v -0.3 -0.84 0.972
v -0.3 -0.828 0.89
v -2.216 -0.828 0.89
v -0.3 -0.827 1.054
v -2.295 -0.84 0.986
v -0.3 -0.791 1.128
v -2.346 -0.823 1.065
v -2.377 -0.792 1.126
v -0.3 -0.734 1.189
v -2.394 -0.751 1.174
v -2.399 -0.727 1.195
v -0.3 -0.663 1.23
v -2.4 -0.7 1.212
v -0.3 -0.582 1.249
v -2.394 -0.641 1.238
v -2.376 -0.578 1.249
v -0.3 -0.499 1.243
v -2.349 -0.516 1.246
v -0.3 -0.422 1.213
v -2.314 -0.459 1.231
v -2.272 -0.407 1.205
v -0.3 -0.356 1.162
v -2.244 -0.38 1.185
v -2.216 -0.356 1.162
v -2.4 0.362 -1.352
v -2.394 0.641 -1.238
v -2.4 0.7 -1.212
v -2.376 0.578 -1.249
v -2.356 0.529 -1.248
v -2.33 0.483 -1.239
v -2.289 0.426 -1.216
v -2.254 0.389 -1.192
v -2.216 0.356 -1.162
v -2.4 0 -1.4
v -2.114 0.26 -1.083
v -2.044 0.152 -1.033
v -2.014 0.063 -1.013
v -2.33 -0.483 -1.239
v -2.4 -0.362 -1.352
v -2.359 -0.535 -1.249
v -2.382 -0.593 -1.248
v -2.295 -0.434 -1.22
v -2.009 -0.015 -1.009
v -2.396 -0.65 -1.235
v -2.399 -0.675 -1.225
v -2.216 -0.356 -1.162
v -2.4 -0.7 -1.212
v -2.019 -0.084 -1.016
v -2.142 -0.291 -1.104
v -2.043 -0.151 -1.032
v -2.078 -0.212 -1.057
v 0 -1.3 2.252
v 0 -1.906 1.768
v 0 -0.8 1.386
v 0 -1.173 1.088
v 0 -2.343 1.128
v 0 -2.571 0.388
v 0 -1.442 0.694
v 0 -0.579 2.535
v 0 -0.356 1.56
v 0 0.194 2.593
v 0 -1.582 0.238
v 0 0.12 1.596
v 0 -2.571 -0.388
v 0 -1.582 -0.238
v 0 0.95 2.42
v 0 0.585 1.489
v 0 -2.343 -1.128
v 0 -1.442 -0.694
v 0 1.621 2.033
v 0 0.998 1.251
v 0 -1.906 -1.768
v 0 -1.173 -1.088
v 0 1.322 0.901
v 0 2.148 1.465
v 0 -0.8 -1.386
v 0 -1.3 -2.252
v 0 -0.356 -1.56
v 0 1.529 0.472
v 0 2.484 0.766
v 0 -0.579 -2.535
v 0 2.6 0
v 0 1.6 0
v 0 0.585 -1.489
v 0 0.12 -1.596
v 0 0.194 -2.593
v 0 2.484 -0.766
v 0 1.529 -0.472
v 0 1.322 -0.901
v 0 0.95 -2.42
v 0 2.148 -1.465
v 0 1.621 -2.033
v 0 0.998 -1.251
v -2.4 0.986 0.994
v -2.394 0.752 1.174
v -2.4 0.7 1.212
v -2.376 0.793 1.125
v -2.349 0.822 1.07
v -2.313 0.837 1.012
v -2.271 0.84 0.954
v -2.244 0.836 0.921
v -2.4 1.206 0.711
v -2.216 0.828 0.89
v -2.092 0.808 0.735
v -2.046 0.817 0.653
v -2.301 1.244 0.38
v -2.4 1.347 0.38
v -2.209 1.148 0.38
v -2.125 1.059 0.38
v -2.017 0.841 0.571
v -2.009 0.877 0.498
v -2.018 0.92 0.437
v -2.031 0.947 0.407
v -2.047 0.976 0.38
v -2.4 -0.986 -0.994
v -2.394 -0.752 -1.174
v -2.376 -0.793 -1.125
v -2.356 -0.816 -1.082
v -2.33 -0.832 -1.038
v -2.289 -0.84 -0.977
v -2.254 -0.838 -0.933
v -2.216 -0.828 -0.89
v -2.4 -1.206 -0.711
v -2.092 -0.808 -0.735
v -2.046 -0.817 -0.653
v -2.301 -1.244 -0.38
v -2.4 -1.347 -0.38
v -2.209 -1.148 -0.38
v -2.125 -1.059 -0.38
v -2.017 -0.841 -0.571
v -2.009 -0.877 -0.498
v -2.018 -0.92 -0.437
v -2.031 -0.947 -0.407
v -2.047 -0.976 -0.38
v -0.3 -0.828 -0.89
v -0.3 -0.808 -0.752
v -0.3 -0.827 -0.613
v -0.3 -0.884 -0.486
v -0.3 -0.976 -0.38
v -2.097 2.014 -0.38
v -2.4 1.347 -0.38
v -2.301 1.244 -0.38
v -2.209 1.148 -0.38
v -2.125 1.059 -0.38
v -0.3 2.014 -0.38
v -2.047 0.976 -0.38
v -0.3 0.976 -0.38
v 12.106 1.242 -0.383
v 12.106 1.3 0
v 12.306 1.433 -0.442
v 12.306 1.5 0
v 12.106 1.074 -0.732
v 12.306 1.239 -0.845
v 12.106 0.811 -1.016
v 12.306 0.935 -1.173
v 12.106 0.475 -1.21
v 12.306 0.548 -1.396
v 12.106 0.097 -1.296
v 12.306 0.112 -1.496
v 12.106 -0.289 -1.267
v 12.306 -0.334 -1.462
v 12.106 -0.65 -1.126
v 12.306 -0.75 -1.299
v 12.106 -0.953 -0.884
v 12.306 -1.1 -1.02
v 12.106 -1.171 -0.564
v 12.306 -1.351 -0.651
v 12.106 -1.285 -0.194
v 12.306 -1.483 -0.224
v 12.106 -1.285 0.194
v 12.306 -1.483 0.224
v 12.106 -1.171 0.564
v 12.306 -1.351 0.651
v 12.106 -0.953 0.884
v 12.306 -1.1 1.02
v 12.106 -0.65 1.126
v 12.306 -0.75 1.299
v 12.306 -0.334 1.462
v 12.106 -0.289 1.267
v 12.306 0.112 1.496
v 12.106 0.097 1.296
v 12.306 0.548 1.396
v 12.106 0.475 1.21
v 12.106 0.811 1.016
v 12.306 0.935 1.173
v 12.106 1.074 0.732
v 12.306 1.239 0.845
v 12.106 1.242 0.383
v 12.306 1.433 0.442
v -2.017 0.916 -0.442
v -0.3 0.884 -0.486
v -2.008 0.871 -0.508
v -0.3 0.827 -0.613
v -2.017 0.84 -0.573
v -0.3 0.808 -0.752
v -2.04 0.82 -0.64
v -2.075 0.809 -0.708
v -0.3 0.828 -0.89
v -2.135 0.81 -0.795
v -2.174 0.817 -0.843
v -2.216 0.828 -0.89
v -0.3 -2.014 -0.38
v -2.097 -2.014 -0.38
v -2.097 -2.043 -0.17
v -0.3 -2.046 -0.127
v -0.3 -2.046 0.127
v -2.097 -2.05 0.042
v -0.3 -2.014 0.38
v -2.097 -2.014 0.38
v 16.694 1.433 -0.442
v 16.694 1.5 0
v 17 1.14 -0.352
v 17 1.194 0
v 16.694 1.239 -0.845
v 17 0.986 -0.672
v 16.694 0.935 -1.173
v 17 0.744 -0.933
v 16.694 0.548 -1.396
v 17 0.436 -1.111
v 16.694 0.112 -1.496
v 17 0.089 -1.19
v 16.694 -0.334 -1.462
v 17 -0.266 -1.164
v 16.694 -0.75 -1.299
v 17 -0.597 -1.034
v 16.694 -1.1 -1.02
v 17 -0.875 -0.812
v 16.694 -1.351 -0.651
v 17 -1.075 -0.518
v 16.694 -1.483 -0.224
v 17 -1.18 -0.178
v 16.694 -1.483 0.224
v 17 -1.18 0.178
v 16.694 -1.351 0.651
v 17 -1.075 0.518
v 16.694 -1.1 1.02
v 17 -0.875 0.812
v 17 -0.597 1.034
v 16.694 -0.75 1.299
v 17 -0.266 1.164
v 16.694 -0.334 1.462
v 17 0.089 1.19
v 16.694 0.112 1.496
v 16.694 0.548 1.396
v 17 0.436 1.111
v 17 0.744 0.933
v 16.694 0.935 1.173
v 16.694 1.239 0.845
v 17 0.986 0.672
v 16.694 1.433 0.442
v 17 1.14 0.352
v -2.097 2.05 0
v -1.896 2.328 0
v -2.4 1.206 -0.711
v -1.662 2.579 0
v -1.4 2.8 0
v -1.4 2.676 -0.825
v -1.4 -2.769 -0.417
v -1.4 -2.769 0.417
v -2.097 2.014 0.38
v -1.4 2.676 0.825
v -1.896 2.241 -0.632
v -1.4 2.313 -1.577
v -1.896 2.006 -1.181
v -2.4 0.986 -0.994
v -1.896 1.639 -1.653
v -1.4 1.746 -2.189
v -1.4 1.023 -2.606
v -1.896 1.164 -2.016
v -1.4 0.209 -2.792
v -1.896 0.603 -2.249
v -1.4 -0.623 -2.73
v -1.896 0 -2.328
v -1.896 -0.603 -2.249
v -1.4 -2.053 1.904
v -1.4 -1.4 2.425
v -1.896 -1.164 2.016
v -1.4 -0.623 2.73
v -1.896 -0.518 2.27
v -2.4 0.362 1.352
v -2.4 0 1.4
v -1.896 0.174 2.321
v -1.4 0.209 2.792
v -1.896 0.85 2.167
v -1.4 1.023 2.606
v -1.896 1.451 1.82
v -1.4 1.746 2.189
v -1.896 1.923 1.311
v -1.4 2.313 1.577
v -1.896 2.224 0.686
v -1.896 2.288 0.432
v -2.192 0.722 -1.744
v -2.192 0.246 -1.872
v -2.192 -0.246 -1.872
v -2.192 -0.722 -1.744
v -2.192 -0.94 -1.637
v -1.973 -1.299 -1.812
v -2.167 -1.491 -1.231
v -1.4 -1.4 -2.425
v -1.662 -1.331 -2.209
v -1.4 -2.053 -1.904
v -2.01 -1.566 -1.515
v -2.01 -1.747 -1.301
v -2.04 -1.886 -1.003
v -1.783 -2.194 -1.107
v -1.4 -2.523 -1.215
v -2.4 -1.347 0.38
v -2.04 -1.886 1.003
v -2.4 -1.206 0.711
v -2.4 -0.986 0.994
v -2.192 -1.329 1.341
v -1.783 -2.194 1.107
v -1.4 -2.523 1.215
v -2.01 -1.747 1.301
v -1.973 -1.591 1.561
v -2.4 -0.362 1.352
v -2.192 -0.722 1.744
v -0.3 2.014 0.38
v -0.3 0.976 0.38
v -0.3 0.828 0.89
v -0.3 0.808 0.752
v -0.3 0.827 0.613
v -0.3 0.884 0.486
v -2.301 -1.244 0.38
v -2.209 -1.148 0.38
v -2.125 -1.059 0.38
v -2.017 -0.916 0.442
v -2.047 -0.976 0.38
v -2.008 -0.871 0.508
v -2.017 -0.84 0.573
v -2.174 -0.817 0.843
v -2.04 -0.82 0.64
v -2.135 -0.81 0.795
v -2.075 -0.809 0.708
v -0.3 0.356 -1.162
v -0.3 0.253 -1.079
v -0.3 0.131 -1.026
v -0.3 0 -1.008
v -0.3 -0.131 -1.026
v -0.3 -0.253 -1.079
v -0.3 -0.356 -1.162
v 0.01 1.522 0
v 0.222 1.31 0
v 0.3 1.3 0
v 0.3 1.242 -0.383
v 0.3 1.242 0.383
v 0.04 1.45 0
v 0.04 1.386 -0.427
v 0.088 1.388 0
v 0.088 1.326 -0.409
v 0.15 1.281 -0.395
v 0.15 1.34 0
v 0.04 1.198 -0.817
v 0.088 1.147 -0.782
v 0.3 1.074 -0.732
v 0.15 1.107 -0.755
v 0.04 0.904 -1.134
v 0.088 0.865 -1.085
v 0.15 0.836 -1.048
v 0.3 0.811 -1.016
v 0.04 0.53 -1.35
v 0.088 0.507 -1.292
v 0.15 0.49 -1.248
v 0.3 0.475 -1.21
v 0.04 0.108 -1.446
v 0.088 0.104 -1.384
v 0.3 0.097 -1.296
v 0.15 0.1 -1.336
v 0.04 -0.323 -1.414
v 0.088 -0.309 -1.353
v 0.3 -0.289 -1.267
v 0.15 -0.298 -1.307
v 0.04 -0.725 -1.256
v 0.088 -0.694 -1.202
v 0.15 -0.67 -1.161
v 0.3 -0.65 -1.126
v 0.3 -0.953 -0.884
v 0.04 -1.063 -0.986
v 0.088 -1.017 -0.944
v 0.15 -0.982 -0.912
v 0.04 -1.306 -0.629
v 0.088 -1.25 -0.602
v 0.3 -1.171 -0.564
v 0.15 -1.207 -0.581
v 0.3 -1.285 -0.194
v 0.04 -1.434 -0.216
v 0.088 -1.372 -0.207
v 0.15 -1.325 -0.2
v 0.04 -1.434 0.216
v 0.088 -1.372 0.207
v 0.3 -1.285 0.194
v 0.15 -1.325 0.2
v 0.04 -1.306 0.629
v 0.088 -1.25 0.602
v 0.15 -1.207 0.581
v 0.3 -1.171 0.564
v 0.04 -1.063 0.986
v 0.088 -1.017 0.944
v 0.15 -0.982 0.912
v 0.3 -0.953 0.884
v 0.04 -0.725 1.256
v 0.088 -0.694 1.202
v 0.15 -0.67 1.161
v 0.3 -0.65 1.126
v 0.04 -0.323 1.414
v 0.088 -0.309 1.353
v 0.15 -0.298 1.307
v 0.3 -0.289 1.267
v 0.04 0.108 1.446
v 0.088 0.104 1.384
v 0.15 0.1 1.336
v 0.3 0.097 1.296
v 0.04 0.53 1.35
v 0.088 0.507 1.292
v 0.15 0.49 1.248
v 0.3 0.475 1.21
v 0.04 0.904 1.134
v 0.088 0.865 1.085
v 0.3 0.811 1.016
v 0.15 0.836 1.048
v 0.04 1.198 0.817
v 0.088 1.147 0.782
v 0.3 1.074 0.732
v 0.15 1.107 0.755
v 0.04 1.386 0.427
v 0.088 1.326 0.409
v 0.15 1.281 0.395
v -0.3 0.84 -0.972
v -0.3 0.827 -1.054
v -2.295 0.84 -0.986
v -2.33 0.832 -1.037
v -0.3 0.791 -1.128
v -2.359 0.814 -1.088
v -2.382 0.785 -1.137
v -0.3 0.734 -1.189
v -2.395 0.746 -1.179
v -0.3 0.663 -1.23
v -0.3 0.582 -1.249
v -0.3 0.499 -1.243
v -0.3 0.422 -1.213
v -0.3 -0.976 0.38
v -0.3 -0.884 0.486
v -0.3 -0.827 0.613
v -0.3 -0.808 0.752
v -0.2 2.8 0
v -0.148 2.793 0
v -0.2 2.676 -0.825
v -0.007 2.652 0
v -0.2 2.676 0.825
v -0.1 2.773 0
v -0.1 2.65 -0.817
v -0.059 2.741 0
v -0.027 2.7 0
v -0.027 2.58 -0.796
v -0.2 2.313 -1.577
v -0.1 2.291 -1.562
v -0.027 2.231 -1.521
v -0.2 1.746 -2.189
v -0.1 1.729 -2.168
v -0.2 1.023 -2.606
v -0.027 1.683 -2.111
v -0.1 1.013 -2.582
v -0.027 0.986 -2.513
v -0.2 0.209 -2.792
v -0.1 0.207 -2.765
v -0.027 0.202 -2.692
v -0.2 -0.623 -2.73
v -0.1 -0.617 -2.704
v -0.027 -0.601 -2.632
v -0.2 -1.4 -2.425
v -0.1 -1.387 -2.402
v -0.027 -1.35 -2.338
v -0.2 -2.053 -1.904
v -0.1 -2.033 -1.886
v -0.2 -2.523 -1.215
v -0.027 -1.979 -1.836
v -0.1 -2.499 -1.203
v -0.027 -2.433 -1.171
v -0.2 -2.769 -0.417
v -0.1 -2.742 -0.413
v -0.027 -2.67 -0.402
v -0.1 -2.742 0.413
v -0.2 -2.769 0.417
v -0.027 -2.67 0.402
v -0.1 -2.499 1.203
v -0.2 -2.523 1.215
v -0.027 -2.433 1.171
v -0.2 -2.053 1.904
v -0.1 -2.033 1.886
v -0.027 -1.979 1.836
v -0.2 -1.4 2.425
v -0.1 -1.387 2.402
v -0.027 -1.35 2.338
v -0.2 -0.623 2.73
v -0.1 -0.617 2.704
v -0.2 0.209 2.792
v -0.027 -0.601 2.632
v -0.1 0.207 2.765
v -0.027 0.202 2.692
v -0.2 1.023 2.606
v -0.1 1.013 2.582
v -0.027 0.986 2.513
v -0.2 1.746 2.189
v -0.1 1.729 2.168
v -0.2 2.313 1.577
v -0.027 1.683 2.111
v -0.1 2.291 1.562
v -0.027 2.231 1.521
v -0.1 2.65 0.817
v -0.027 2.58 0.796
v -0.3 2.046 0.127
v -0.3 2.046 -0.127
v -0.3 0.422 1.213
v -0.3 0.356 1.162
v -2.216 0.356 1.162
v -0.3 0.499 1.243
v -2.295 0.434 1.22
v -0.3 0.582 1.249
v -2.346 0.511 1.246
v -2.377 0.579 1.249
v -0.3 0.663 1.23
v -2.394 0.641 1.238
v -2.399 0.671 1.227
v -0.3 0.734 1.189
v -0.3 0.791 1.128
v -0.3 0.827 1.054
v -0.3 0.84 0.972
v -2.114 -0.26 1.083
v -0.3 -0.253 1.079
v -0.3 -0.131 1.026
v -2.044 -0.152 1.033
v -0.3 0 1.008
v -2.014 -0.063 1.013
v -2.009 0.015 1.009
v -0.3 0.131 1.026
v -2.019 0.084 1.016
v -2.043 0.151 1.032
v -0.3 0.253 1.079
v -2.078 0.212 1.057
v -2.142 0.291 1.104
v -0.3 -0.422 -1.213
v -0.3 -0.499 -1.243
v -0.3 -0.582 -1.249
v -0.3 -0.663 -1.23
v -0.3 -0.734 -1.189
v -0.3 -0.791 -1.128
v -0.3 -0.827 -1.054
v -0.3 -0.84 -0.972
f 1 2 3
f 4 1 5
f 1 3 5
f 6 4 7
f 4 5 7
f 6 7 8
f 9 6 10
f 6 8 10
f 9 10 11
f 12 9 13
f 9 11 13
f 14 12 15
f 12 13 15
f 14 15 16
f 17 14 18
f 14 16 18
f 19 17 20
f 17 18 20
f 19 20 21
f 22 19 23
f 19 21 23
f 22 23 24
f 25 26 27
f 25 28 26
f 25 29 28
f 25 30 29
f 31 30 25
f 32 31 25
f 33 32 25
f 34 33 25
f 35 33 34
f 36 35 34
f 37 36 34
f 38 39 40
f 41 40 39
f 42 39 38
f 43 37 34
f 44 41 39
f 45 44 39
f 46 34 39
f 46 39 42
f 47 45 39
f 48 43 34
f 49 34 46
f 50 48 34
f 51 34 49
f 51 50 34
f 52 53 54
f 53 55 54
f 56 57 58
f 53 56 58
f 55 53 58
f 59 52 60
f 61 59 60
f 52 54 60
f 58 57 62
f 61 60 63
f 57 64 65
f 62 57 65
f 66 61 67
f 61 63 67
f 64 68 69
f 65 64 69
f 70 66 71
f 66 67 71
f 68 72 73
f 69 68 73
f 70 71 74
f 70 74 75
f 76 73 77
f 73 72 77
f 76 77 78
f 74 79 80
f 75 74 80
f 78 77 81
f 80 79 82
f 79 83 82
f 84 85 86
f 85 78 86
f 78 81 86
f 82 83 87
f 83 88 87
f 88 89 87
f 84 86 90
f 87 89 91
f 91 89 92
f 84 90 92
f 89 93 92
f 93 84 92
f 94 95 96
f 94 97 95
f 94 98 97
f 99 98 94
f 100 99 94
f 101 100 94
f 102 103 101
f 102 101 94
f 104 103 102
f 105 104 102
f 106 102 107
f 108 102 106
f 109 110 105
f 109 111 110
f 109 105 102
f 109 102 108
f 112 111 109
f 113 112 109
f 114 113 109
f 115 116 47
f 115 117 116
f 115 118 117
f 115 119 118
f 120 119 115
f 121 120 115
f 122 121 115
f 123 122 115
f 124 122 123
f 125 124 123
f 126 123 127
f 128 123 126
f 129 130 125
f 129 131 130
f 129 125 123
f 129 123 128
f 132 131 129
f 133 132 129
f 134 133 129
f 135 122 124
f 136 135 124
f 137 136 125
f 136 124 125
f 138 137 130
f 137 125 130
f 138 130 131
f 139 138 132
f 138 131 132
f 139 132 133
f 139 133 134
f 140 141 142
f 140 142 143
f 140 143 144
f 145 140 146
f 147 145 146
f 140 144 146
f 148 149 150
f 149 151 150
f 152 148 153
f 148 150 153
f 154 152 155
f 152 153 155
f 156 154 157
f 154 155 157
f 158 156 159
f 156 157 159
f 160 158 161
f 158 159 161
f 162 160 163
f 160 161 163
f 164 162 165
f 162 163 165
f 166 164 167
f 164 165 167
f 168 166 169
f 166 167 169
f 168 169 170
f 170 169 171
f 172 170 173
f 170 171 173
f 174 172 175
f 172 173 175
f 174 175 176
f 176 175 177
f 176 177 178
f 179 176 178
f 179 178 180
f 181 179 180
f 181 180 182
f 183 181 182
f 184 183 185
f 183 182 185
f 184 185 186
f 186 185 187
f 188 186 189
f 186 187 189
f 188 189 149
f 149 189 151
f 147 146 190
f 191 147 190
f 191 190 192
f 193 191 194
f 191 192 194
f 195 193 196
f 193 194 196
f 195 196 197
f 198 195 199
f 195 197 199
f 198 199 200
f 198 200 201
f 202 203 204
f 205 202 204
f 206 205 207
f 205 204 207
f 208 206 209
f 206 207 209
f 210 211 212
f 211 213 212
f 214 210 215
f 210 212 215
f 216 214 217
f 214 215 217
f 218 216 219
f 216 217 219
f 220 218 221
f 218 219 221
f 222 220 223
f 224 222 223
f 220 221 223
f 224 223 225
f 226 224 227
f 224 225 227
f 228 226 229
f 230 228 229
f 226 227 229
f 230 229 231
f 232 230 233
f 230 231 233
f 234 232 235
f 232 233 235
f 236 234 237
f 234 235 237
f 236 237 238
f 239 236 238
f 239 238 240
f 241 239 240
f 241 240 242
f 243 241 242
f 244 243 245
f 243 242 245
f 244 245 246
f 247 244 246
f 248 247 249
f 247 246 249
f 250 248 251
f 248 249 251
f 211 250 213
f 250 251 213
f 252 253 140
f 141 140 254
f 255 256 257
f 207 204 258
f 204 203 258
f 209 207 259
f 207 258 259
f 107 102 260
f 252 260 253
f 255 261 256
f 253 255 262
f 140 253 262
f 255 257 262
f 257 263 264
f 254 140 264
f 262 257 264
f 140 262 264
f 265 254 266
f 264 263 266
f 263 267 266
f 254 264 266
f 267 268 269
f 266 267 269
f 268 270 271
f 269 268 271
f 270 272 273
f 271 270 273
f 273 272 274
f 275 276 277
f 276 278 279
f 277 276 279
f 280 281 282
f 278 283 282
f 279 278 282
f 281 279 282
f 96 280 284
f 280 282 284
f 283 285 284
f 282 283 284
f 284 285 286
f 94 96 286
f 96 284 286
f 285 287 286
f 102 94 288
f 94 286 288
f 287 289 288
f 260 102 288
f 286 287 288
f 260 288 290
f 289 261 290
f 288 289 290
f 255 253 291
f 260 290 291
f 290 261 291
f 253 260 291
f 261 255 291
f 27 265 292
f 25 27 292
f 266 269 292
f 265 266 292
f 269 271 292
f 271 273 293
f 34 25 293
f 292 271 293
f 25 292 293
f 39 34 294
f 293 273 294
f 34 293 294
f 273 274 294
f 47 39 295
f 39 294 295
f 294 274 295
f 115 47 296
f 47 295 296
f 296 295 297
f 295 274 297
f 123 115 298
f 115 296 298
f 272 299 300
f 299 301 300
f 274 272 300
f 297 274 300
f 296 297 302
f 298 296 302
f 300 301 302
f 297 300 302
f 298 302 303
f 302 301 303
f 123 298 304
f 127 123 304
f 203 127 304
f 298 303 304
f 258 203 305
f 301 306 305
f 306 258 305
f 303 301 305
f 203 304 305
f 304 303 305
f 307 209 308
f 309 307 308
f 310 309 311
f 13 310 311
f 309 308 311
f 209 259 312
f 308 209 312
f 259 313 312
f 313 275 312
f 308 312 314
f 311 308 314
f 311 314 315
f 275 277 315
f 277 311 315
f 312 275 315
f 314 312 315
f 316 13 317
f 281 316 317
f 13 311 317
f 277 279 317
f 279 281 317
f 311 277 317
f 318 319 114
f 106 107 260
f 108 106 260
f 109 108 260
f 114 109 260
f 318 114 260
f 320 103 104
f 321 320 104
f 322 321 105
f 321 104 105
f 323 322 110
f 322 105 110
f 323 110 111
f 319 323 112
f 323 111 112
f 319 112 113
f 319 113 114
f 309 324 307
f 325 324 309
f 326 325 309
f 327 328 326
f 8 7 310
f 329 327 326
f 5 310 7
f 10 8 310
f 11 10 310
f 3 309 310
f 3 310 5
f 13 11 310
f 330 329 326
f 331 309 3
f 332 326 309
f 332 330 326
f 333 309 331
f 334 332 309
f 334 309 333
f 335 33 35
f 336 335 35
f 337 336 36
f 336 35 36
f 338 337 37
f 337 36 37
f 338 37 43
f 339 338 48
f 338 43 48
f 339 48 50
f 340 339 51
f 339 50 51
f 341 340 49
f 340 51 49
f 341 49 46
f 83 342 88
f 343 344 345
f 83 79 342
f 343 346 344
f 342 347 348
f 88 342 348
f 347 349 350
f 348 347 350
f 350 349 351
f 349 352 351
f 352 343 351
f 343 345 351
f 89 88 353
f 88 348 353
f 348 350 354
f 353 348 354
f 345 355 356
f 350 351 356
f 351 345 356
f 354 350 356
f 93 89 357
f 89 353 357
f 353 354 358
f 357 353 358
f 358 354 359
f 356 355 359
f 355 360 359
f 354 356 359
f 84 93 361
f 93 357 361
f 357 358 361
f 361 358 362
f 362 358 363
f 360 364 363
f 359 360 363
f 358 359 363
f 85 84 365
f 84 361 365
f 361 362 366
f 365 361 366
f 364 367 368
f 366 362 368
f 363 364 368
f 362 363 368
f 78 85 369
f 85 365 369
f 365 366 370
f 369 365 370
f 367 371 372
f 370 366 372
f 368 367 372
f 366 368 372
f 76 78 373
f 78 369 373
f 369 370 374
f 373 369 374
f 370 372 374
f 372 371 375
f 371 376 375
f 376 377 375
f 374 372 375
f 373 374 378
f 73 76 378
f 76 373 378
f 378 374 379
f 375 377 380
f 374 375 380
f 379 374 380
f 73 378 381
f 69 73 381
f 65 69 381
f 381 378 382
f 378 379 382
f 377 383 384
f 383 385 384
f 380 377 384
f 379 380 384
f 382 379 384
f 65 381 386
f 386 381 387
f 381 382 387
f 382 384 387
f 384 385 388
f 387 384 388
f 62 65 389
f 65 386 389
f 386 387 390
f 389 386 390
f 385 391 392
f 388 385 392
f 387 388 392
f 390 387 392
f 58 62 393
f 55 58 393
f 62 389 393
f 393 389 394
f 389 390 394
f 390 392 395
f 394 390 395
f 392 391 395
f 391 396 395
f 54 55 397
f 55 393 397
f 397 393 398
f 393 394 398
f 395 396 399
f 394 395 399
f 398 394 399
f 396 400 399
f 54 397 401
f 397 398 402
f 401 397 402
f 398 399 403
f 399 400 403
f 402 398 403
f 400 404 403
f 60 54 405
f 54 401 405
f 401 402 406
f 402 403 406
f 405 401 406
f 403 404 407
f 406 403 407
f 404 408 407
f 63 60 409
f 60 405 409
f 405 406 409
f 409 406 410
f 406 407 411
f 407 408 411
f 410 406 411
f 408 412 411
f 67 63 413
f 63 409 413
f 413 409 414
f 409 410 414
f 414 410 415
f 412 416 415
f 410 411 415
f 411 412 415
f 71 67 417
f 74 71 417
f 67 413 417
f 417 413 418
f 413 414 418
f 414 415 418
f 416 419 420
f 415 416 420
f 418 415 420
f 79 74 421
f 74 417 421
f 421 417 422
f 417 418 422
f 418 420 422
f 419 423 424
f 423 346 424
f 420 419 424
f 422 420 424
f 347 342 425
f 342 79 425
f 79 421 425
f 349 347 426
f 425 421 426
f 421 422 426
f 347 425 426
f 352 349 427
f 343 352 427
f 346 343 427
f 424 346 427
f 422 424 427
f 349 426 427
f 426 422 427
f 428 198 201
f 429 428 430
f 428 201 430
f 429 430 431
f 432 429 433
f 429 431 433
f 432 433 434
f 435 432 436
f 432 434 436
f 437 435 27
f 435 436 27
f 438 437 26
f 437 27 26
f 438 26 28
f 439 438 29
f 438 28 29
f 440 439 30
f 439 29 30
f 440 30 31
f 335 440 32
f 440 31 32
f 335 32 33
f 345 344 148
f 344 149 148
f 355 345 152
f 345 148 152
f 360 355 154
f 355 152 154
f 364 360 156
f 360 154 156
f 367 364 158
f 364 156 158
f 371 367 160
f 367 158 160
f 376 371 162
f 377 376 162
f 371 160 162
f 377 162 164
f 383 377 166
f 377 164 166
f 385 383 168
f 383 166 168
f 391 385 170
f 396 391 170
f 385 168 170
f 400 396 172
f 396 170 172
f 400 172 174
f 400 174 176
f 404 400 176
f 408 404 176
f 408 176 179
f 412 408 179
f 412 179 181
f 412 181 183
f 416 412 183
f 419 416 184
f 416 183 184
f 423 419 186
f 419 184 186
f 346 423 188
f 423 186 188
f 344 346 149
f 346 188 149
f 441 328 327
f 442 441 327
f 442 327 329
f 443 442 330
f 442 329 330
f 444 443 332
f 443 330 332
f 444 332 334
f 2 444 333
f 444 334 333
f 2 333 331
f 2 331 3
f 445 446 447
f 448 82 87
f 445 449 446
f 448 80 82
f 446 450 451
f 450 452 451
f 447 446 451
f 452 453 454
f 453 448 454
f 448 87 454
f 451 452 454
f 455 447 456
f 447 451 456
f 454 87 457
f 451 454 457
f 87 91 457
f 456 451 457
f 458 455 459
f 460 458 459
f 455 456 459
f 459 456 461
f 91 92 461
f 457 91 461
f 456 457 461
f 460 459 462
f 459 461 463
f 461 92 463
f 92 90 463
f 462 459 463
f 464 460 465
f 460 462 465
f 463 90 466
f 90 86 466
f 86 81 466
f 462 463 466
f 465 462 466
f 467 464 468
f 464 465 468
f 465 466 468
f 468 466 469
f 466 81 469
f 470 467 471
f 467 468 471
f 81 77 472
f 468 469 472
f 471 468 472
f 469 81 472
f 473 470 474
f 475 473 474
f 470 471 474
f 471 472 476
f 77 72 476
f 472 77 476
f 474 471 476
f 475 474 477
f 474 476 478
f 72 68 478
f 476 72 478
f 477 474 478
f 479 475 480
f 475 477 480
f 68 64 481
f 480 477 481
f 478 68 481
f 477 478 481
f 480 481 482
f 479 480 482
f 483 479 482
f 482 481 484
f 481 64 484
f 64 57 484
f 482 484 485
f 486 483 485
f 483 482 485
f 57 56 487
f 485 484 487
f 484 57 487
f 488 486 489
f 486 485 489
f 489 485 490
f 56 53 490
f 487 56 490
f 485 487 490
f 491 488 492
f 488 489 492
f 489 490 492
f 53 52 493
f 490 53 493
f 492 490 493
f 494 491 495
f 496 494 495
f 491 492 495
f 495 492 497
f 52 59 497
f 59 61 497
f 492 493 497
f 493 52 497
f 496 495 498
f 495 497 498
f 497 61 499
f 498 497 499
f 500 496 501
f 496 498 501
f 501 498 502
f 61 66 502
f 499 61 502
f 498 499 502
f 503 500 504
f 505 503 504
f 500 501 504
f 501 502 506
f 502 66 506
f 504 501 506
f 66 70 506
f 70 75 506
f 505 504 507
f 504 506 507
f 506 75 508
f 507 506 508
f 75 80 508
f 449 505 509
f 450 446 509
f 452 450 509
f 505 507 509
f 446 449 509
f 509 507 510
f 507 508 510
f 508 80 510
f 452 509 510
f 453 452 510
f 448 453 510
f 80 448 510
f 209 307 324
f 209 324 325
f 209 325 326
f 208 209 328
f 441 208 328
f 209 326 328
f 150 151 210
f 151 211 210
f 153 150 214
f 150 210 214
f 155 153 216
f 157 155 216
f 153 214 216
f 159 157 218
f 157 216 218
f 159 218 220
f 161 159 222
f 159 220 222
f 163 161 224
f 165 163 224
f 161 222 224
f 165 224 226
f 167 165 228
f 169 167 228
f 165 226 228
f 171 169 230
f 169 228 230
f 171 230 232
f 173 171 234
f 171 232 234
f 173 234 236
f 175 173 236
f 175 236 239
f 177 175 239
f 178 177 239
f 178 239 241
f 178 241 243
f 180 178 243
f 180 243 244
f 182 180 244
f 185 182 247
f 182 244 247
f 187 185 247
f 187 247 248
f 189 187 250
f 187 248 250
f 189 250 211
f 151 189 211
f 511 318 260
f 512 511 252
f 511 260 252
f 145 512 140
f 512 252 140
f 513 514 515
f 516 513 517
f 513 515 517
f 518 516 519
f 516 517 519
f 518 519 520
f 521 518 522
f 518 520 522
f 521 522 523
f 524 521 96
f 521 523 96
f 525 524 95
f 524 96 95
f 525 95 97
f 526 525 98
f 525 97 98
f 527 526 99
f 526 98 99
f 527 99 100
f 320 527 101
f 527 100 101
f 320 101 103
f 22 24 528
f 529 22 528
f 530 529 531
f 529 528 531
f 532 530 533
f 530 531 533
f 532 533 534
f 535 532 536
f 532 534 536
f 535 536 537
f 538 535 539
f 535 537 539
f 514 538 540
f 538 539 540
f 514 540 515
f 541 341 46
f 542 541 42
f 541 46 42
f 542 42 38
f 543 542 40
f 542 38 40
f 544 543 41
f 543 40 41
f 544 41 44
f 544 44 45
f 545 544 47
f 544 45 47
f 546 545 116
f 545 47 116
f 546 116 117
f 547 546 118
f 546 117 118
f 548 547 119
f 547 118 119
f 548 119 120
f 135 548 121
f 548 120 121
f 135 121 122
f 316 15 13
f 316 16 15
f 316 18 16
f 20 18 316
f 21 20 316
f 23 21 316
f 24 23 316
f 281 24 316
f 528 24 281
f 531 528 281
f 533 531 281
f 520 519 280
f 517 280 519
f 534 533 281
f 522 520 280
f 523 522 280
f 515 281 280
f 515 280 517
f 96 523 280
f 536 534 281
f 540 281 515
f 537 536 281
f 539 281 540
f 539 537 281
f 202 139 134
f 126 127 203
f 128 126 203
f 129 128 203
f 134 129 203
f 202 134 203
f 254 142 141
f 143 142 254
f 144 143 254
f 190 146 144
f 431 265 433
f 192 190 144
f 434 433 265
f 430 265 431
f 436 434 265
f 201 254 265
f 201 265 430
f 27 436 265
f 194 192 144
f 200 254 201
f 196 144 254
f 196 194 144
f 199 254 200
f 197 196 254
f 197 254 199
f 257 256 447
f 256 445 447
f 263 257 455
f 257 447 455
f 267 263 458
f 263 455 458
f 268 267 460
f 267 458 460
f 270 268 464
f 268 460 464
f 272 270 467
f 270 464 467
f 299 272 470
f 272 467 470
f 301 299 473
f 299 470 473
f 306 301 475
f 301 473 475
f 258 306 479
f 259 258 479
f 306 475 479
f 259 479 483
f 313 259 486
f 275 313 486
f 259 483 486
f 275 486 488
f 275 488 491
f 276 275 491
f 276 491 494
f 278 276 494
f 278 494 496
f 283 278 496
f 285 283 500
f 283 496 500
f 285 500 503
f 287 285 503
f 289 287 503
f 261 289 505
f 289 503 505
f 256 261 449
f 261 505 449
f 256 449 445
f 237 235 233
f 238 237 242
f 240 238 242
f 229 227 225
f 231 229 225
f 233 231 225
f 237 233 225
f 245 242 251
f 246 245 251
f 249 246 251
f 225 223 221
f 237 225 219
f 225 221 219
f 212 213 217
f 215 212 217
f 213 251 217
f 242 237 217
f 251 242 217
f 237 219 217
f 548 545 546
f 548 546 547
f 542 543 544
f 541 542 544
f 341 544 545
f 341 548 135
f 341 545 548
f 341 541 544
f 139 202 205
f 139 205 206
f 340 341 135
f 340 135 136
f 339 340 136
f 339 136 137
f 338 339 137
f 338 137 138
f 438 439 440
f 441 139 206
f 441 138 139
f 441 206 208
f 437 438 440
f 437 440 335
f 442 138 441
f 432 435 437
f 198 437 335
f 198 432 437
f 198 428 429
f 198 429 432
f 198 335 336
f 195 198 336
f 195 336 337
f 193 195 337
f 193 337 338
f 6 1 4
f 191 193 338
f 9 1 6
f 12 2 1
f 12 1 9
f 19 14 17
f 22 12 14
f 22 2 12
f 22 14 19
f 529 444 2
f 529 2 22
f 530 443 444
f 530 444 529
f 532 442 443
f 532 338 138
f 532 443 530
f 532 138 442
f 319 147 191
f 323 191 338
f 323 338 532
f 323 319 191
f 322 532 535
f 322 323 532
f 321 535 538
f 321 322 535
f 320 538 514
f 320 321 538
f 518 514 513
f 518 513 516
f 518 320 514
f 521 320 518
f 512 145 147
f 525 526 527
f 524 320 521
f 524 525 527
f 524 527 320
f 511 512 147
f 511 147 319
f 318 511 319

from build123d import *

# Parameters (mm, degrees)
CUT_EXTRUDE1_DEPTH = 2.1


with BuildPart() as part:
    # Sketch1 → Revolve1 (revolve)
    with BuildSketch(Plane.XY):
        with BuildLine():
            Line((-2.4, 0), (-2.4, 1.4))
            ThreePointArc((-2.4, 1.4), (-2.010193737, 2.178709812), (-1.4, 2.8))
            Line((-1.4, 2.8), (-0.2, 2.8))
            ThreePointArc((-0.2, 2.8), (-0.058578644, 2.741421356), (0, 2.6))
            Line((0, 2.6), (0, 1.6))
            ThreePointArc((0, 1.6), (0.087867966, 1.387867966), (0.3, 1.3))
            Line((0.3, 1.3), (12.1065, 1.3))
            Line((12.1065, 1.3), (12.3065, 1.5))
            Line((12.3065, 1.5), (16.6935, 1.5))
            Line((16.6935, 1.5), (17, 1.1935))
            Line((17, 1.1935), (17, 0))
            Line((17, 0), (-2.4, 0))
        make_face()
    revolve(axis=Axis((17, 0, 0), (-1, 0, 0)))

    # Sketch2 → Cut-Extrude1 (cut)
    with BuildSketch(Plane.ZY.offset(2.4)):
        with BuildLine():
            Line((0.38, -2.014472636), (0.38, -0.975538848))
            ThreePointArc((0.38, -0.975538848), (0.613182892, -0.826946318), (0.88968299, -0.828248869))
            ThreePointArc((0.88968299, -0.828248869), (1.212435563, -0.700000005), (1.162126064, -0.356363644))
            ThreePointArc((1.162126064, -0.356363644), (1.008436863, -6e-09), (1.162126056, 0.356363636))
            ThreePointArc((1.162126056, 0.356363636), (1.212435568, 0.699999995), (0.889683001, 0.828248872))
            ThreePointArc((0.889683001, 0.828248872), (0.613182897, 0.826946316), (0.38, 0.975538848))
            Line((0.38, 0.975538848), (0.38, 2.014472636))
            ThreePointArc((0.38, 2.014472636), (0, 2.05), (-0.38, 2.014472636))
            Line((-0.38, 2.014472636), (-0.38, 0.975538848))
            ThreePointArc((-0.38, 0.975538848), (-0.613182887, 0.826946319), (-0.889682981, 0.828248866))
            ThreePointArc((-0.889682981, 0.828248866), (-1.212435565, 0.700000001), (-1.162126051, 0.356363631))
            ThreePointArc((-1.162126051, 0.356363631), (-1.008436863, -7e-09), (-1.162126061, -0.356363641))
            ThreePointArc((-1.162126061, -0.356363641), (-1.212435561, -0.700000008), (-0.889682979, -0.828248866))
            ThreePointArc((-0.889682979, -0.828248866), (-0.613182886, -0.826946319), (-0.38, -0.975538848))
            Line((-0.38, -0.975538848), (-0.38, -2.014472636))
            ThreePointArc((-0.38, -2.014472636), (0, -2.05), (0.38, -2.014472636))
        make_face()
    extrude(amount=-CUT_EXTRUDE1_DEPTH, mode=Mode.SUBTRACT)

    # Sketch3 → Cut-Revolve1 (revolve, cut)
    with BuildSketch(Plane.XY):
        Polygon((-2.4, 0), (-2.4, 1.4), (-1, 0), align=None)
    revolve(axis=Axis((-1, 0, 0), (-1, 0, 0)), mode=Mode.SUBTRACT)


solid = part.part
